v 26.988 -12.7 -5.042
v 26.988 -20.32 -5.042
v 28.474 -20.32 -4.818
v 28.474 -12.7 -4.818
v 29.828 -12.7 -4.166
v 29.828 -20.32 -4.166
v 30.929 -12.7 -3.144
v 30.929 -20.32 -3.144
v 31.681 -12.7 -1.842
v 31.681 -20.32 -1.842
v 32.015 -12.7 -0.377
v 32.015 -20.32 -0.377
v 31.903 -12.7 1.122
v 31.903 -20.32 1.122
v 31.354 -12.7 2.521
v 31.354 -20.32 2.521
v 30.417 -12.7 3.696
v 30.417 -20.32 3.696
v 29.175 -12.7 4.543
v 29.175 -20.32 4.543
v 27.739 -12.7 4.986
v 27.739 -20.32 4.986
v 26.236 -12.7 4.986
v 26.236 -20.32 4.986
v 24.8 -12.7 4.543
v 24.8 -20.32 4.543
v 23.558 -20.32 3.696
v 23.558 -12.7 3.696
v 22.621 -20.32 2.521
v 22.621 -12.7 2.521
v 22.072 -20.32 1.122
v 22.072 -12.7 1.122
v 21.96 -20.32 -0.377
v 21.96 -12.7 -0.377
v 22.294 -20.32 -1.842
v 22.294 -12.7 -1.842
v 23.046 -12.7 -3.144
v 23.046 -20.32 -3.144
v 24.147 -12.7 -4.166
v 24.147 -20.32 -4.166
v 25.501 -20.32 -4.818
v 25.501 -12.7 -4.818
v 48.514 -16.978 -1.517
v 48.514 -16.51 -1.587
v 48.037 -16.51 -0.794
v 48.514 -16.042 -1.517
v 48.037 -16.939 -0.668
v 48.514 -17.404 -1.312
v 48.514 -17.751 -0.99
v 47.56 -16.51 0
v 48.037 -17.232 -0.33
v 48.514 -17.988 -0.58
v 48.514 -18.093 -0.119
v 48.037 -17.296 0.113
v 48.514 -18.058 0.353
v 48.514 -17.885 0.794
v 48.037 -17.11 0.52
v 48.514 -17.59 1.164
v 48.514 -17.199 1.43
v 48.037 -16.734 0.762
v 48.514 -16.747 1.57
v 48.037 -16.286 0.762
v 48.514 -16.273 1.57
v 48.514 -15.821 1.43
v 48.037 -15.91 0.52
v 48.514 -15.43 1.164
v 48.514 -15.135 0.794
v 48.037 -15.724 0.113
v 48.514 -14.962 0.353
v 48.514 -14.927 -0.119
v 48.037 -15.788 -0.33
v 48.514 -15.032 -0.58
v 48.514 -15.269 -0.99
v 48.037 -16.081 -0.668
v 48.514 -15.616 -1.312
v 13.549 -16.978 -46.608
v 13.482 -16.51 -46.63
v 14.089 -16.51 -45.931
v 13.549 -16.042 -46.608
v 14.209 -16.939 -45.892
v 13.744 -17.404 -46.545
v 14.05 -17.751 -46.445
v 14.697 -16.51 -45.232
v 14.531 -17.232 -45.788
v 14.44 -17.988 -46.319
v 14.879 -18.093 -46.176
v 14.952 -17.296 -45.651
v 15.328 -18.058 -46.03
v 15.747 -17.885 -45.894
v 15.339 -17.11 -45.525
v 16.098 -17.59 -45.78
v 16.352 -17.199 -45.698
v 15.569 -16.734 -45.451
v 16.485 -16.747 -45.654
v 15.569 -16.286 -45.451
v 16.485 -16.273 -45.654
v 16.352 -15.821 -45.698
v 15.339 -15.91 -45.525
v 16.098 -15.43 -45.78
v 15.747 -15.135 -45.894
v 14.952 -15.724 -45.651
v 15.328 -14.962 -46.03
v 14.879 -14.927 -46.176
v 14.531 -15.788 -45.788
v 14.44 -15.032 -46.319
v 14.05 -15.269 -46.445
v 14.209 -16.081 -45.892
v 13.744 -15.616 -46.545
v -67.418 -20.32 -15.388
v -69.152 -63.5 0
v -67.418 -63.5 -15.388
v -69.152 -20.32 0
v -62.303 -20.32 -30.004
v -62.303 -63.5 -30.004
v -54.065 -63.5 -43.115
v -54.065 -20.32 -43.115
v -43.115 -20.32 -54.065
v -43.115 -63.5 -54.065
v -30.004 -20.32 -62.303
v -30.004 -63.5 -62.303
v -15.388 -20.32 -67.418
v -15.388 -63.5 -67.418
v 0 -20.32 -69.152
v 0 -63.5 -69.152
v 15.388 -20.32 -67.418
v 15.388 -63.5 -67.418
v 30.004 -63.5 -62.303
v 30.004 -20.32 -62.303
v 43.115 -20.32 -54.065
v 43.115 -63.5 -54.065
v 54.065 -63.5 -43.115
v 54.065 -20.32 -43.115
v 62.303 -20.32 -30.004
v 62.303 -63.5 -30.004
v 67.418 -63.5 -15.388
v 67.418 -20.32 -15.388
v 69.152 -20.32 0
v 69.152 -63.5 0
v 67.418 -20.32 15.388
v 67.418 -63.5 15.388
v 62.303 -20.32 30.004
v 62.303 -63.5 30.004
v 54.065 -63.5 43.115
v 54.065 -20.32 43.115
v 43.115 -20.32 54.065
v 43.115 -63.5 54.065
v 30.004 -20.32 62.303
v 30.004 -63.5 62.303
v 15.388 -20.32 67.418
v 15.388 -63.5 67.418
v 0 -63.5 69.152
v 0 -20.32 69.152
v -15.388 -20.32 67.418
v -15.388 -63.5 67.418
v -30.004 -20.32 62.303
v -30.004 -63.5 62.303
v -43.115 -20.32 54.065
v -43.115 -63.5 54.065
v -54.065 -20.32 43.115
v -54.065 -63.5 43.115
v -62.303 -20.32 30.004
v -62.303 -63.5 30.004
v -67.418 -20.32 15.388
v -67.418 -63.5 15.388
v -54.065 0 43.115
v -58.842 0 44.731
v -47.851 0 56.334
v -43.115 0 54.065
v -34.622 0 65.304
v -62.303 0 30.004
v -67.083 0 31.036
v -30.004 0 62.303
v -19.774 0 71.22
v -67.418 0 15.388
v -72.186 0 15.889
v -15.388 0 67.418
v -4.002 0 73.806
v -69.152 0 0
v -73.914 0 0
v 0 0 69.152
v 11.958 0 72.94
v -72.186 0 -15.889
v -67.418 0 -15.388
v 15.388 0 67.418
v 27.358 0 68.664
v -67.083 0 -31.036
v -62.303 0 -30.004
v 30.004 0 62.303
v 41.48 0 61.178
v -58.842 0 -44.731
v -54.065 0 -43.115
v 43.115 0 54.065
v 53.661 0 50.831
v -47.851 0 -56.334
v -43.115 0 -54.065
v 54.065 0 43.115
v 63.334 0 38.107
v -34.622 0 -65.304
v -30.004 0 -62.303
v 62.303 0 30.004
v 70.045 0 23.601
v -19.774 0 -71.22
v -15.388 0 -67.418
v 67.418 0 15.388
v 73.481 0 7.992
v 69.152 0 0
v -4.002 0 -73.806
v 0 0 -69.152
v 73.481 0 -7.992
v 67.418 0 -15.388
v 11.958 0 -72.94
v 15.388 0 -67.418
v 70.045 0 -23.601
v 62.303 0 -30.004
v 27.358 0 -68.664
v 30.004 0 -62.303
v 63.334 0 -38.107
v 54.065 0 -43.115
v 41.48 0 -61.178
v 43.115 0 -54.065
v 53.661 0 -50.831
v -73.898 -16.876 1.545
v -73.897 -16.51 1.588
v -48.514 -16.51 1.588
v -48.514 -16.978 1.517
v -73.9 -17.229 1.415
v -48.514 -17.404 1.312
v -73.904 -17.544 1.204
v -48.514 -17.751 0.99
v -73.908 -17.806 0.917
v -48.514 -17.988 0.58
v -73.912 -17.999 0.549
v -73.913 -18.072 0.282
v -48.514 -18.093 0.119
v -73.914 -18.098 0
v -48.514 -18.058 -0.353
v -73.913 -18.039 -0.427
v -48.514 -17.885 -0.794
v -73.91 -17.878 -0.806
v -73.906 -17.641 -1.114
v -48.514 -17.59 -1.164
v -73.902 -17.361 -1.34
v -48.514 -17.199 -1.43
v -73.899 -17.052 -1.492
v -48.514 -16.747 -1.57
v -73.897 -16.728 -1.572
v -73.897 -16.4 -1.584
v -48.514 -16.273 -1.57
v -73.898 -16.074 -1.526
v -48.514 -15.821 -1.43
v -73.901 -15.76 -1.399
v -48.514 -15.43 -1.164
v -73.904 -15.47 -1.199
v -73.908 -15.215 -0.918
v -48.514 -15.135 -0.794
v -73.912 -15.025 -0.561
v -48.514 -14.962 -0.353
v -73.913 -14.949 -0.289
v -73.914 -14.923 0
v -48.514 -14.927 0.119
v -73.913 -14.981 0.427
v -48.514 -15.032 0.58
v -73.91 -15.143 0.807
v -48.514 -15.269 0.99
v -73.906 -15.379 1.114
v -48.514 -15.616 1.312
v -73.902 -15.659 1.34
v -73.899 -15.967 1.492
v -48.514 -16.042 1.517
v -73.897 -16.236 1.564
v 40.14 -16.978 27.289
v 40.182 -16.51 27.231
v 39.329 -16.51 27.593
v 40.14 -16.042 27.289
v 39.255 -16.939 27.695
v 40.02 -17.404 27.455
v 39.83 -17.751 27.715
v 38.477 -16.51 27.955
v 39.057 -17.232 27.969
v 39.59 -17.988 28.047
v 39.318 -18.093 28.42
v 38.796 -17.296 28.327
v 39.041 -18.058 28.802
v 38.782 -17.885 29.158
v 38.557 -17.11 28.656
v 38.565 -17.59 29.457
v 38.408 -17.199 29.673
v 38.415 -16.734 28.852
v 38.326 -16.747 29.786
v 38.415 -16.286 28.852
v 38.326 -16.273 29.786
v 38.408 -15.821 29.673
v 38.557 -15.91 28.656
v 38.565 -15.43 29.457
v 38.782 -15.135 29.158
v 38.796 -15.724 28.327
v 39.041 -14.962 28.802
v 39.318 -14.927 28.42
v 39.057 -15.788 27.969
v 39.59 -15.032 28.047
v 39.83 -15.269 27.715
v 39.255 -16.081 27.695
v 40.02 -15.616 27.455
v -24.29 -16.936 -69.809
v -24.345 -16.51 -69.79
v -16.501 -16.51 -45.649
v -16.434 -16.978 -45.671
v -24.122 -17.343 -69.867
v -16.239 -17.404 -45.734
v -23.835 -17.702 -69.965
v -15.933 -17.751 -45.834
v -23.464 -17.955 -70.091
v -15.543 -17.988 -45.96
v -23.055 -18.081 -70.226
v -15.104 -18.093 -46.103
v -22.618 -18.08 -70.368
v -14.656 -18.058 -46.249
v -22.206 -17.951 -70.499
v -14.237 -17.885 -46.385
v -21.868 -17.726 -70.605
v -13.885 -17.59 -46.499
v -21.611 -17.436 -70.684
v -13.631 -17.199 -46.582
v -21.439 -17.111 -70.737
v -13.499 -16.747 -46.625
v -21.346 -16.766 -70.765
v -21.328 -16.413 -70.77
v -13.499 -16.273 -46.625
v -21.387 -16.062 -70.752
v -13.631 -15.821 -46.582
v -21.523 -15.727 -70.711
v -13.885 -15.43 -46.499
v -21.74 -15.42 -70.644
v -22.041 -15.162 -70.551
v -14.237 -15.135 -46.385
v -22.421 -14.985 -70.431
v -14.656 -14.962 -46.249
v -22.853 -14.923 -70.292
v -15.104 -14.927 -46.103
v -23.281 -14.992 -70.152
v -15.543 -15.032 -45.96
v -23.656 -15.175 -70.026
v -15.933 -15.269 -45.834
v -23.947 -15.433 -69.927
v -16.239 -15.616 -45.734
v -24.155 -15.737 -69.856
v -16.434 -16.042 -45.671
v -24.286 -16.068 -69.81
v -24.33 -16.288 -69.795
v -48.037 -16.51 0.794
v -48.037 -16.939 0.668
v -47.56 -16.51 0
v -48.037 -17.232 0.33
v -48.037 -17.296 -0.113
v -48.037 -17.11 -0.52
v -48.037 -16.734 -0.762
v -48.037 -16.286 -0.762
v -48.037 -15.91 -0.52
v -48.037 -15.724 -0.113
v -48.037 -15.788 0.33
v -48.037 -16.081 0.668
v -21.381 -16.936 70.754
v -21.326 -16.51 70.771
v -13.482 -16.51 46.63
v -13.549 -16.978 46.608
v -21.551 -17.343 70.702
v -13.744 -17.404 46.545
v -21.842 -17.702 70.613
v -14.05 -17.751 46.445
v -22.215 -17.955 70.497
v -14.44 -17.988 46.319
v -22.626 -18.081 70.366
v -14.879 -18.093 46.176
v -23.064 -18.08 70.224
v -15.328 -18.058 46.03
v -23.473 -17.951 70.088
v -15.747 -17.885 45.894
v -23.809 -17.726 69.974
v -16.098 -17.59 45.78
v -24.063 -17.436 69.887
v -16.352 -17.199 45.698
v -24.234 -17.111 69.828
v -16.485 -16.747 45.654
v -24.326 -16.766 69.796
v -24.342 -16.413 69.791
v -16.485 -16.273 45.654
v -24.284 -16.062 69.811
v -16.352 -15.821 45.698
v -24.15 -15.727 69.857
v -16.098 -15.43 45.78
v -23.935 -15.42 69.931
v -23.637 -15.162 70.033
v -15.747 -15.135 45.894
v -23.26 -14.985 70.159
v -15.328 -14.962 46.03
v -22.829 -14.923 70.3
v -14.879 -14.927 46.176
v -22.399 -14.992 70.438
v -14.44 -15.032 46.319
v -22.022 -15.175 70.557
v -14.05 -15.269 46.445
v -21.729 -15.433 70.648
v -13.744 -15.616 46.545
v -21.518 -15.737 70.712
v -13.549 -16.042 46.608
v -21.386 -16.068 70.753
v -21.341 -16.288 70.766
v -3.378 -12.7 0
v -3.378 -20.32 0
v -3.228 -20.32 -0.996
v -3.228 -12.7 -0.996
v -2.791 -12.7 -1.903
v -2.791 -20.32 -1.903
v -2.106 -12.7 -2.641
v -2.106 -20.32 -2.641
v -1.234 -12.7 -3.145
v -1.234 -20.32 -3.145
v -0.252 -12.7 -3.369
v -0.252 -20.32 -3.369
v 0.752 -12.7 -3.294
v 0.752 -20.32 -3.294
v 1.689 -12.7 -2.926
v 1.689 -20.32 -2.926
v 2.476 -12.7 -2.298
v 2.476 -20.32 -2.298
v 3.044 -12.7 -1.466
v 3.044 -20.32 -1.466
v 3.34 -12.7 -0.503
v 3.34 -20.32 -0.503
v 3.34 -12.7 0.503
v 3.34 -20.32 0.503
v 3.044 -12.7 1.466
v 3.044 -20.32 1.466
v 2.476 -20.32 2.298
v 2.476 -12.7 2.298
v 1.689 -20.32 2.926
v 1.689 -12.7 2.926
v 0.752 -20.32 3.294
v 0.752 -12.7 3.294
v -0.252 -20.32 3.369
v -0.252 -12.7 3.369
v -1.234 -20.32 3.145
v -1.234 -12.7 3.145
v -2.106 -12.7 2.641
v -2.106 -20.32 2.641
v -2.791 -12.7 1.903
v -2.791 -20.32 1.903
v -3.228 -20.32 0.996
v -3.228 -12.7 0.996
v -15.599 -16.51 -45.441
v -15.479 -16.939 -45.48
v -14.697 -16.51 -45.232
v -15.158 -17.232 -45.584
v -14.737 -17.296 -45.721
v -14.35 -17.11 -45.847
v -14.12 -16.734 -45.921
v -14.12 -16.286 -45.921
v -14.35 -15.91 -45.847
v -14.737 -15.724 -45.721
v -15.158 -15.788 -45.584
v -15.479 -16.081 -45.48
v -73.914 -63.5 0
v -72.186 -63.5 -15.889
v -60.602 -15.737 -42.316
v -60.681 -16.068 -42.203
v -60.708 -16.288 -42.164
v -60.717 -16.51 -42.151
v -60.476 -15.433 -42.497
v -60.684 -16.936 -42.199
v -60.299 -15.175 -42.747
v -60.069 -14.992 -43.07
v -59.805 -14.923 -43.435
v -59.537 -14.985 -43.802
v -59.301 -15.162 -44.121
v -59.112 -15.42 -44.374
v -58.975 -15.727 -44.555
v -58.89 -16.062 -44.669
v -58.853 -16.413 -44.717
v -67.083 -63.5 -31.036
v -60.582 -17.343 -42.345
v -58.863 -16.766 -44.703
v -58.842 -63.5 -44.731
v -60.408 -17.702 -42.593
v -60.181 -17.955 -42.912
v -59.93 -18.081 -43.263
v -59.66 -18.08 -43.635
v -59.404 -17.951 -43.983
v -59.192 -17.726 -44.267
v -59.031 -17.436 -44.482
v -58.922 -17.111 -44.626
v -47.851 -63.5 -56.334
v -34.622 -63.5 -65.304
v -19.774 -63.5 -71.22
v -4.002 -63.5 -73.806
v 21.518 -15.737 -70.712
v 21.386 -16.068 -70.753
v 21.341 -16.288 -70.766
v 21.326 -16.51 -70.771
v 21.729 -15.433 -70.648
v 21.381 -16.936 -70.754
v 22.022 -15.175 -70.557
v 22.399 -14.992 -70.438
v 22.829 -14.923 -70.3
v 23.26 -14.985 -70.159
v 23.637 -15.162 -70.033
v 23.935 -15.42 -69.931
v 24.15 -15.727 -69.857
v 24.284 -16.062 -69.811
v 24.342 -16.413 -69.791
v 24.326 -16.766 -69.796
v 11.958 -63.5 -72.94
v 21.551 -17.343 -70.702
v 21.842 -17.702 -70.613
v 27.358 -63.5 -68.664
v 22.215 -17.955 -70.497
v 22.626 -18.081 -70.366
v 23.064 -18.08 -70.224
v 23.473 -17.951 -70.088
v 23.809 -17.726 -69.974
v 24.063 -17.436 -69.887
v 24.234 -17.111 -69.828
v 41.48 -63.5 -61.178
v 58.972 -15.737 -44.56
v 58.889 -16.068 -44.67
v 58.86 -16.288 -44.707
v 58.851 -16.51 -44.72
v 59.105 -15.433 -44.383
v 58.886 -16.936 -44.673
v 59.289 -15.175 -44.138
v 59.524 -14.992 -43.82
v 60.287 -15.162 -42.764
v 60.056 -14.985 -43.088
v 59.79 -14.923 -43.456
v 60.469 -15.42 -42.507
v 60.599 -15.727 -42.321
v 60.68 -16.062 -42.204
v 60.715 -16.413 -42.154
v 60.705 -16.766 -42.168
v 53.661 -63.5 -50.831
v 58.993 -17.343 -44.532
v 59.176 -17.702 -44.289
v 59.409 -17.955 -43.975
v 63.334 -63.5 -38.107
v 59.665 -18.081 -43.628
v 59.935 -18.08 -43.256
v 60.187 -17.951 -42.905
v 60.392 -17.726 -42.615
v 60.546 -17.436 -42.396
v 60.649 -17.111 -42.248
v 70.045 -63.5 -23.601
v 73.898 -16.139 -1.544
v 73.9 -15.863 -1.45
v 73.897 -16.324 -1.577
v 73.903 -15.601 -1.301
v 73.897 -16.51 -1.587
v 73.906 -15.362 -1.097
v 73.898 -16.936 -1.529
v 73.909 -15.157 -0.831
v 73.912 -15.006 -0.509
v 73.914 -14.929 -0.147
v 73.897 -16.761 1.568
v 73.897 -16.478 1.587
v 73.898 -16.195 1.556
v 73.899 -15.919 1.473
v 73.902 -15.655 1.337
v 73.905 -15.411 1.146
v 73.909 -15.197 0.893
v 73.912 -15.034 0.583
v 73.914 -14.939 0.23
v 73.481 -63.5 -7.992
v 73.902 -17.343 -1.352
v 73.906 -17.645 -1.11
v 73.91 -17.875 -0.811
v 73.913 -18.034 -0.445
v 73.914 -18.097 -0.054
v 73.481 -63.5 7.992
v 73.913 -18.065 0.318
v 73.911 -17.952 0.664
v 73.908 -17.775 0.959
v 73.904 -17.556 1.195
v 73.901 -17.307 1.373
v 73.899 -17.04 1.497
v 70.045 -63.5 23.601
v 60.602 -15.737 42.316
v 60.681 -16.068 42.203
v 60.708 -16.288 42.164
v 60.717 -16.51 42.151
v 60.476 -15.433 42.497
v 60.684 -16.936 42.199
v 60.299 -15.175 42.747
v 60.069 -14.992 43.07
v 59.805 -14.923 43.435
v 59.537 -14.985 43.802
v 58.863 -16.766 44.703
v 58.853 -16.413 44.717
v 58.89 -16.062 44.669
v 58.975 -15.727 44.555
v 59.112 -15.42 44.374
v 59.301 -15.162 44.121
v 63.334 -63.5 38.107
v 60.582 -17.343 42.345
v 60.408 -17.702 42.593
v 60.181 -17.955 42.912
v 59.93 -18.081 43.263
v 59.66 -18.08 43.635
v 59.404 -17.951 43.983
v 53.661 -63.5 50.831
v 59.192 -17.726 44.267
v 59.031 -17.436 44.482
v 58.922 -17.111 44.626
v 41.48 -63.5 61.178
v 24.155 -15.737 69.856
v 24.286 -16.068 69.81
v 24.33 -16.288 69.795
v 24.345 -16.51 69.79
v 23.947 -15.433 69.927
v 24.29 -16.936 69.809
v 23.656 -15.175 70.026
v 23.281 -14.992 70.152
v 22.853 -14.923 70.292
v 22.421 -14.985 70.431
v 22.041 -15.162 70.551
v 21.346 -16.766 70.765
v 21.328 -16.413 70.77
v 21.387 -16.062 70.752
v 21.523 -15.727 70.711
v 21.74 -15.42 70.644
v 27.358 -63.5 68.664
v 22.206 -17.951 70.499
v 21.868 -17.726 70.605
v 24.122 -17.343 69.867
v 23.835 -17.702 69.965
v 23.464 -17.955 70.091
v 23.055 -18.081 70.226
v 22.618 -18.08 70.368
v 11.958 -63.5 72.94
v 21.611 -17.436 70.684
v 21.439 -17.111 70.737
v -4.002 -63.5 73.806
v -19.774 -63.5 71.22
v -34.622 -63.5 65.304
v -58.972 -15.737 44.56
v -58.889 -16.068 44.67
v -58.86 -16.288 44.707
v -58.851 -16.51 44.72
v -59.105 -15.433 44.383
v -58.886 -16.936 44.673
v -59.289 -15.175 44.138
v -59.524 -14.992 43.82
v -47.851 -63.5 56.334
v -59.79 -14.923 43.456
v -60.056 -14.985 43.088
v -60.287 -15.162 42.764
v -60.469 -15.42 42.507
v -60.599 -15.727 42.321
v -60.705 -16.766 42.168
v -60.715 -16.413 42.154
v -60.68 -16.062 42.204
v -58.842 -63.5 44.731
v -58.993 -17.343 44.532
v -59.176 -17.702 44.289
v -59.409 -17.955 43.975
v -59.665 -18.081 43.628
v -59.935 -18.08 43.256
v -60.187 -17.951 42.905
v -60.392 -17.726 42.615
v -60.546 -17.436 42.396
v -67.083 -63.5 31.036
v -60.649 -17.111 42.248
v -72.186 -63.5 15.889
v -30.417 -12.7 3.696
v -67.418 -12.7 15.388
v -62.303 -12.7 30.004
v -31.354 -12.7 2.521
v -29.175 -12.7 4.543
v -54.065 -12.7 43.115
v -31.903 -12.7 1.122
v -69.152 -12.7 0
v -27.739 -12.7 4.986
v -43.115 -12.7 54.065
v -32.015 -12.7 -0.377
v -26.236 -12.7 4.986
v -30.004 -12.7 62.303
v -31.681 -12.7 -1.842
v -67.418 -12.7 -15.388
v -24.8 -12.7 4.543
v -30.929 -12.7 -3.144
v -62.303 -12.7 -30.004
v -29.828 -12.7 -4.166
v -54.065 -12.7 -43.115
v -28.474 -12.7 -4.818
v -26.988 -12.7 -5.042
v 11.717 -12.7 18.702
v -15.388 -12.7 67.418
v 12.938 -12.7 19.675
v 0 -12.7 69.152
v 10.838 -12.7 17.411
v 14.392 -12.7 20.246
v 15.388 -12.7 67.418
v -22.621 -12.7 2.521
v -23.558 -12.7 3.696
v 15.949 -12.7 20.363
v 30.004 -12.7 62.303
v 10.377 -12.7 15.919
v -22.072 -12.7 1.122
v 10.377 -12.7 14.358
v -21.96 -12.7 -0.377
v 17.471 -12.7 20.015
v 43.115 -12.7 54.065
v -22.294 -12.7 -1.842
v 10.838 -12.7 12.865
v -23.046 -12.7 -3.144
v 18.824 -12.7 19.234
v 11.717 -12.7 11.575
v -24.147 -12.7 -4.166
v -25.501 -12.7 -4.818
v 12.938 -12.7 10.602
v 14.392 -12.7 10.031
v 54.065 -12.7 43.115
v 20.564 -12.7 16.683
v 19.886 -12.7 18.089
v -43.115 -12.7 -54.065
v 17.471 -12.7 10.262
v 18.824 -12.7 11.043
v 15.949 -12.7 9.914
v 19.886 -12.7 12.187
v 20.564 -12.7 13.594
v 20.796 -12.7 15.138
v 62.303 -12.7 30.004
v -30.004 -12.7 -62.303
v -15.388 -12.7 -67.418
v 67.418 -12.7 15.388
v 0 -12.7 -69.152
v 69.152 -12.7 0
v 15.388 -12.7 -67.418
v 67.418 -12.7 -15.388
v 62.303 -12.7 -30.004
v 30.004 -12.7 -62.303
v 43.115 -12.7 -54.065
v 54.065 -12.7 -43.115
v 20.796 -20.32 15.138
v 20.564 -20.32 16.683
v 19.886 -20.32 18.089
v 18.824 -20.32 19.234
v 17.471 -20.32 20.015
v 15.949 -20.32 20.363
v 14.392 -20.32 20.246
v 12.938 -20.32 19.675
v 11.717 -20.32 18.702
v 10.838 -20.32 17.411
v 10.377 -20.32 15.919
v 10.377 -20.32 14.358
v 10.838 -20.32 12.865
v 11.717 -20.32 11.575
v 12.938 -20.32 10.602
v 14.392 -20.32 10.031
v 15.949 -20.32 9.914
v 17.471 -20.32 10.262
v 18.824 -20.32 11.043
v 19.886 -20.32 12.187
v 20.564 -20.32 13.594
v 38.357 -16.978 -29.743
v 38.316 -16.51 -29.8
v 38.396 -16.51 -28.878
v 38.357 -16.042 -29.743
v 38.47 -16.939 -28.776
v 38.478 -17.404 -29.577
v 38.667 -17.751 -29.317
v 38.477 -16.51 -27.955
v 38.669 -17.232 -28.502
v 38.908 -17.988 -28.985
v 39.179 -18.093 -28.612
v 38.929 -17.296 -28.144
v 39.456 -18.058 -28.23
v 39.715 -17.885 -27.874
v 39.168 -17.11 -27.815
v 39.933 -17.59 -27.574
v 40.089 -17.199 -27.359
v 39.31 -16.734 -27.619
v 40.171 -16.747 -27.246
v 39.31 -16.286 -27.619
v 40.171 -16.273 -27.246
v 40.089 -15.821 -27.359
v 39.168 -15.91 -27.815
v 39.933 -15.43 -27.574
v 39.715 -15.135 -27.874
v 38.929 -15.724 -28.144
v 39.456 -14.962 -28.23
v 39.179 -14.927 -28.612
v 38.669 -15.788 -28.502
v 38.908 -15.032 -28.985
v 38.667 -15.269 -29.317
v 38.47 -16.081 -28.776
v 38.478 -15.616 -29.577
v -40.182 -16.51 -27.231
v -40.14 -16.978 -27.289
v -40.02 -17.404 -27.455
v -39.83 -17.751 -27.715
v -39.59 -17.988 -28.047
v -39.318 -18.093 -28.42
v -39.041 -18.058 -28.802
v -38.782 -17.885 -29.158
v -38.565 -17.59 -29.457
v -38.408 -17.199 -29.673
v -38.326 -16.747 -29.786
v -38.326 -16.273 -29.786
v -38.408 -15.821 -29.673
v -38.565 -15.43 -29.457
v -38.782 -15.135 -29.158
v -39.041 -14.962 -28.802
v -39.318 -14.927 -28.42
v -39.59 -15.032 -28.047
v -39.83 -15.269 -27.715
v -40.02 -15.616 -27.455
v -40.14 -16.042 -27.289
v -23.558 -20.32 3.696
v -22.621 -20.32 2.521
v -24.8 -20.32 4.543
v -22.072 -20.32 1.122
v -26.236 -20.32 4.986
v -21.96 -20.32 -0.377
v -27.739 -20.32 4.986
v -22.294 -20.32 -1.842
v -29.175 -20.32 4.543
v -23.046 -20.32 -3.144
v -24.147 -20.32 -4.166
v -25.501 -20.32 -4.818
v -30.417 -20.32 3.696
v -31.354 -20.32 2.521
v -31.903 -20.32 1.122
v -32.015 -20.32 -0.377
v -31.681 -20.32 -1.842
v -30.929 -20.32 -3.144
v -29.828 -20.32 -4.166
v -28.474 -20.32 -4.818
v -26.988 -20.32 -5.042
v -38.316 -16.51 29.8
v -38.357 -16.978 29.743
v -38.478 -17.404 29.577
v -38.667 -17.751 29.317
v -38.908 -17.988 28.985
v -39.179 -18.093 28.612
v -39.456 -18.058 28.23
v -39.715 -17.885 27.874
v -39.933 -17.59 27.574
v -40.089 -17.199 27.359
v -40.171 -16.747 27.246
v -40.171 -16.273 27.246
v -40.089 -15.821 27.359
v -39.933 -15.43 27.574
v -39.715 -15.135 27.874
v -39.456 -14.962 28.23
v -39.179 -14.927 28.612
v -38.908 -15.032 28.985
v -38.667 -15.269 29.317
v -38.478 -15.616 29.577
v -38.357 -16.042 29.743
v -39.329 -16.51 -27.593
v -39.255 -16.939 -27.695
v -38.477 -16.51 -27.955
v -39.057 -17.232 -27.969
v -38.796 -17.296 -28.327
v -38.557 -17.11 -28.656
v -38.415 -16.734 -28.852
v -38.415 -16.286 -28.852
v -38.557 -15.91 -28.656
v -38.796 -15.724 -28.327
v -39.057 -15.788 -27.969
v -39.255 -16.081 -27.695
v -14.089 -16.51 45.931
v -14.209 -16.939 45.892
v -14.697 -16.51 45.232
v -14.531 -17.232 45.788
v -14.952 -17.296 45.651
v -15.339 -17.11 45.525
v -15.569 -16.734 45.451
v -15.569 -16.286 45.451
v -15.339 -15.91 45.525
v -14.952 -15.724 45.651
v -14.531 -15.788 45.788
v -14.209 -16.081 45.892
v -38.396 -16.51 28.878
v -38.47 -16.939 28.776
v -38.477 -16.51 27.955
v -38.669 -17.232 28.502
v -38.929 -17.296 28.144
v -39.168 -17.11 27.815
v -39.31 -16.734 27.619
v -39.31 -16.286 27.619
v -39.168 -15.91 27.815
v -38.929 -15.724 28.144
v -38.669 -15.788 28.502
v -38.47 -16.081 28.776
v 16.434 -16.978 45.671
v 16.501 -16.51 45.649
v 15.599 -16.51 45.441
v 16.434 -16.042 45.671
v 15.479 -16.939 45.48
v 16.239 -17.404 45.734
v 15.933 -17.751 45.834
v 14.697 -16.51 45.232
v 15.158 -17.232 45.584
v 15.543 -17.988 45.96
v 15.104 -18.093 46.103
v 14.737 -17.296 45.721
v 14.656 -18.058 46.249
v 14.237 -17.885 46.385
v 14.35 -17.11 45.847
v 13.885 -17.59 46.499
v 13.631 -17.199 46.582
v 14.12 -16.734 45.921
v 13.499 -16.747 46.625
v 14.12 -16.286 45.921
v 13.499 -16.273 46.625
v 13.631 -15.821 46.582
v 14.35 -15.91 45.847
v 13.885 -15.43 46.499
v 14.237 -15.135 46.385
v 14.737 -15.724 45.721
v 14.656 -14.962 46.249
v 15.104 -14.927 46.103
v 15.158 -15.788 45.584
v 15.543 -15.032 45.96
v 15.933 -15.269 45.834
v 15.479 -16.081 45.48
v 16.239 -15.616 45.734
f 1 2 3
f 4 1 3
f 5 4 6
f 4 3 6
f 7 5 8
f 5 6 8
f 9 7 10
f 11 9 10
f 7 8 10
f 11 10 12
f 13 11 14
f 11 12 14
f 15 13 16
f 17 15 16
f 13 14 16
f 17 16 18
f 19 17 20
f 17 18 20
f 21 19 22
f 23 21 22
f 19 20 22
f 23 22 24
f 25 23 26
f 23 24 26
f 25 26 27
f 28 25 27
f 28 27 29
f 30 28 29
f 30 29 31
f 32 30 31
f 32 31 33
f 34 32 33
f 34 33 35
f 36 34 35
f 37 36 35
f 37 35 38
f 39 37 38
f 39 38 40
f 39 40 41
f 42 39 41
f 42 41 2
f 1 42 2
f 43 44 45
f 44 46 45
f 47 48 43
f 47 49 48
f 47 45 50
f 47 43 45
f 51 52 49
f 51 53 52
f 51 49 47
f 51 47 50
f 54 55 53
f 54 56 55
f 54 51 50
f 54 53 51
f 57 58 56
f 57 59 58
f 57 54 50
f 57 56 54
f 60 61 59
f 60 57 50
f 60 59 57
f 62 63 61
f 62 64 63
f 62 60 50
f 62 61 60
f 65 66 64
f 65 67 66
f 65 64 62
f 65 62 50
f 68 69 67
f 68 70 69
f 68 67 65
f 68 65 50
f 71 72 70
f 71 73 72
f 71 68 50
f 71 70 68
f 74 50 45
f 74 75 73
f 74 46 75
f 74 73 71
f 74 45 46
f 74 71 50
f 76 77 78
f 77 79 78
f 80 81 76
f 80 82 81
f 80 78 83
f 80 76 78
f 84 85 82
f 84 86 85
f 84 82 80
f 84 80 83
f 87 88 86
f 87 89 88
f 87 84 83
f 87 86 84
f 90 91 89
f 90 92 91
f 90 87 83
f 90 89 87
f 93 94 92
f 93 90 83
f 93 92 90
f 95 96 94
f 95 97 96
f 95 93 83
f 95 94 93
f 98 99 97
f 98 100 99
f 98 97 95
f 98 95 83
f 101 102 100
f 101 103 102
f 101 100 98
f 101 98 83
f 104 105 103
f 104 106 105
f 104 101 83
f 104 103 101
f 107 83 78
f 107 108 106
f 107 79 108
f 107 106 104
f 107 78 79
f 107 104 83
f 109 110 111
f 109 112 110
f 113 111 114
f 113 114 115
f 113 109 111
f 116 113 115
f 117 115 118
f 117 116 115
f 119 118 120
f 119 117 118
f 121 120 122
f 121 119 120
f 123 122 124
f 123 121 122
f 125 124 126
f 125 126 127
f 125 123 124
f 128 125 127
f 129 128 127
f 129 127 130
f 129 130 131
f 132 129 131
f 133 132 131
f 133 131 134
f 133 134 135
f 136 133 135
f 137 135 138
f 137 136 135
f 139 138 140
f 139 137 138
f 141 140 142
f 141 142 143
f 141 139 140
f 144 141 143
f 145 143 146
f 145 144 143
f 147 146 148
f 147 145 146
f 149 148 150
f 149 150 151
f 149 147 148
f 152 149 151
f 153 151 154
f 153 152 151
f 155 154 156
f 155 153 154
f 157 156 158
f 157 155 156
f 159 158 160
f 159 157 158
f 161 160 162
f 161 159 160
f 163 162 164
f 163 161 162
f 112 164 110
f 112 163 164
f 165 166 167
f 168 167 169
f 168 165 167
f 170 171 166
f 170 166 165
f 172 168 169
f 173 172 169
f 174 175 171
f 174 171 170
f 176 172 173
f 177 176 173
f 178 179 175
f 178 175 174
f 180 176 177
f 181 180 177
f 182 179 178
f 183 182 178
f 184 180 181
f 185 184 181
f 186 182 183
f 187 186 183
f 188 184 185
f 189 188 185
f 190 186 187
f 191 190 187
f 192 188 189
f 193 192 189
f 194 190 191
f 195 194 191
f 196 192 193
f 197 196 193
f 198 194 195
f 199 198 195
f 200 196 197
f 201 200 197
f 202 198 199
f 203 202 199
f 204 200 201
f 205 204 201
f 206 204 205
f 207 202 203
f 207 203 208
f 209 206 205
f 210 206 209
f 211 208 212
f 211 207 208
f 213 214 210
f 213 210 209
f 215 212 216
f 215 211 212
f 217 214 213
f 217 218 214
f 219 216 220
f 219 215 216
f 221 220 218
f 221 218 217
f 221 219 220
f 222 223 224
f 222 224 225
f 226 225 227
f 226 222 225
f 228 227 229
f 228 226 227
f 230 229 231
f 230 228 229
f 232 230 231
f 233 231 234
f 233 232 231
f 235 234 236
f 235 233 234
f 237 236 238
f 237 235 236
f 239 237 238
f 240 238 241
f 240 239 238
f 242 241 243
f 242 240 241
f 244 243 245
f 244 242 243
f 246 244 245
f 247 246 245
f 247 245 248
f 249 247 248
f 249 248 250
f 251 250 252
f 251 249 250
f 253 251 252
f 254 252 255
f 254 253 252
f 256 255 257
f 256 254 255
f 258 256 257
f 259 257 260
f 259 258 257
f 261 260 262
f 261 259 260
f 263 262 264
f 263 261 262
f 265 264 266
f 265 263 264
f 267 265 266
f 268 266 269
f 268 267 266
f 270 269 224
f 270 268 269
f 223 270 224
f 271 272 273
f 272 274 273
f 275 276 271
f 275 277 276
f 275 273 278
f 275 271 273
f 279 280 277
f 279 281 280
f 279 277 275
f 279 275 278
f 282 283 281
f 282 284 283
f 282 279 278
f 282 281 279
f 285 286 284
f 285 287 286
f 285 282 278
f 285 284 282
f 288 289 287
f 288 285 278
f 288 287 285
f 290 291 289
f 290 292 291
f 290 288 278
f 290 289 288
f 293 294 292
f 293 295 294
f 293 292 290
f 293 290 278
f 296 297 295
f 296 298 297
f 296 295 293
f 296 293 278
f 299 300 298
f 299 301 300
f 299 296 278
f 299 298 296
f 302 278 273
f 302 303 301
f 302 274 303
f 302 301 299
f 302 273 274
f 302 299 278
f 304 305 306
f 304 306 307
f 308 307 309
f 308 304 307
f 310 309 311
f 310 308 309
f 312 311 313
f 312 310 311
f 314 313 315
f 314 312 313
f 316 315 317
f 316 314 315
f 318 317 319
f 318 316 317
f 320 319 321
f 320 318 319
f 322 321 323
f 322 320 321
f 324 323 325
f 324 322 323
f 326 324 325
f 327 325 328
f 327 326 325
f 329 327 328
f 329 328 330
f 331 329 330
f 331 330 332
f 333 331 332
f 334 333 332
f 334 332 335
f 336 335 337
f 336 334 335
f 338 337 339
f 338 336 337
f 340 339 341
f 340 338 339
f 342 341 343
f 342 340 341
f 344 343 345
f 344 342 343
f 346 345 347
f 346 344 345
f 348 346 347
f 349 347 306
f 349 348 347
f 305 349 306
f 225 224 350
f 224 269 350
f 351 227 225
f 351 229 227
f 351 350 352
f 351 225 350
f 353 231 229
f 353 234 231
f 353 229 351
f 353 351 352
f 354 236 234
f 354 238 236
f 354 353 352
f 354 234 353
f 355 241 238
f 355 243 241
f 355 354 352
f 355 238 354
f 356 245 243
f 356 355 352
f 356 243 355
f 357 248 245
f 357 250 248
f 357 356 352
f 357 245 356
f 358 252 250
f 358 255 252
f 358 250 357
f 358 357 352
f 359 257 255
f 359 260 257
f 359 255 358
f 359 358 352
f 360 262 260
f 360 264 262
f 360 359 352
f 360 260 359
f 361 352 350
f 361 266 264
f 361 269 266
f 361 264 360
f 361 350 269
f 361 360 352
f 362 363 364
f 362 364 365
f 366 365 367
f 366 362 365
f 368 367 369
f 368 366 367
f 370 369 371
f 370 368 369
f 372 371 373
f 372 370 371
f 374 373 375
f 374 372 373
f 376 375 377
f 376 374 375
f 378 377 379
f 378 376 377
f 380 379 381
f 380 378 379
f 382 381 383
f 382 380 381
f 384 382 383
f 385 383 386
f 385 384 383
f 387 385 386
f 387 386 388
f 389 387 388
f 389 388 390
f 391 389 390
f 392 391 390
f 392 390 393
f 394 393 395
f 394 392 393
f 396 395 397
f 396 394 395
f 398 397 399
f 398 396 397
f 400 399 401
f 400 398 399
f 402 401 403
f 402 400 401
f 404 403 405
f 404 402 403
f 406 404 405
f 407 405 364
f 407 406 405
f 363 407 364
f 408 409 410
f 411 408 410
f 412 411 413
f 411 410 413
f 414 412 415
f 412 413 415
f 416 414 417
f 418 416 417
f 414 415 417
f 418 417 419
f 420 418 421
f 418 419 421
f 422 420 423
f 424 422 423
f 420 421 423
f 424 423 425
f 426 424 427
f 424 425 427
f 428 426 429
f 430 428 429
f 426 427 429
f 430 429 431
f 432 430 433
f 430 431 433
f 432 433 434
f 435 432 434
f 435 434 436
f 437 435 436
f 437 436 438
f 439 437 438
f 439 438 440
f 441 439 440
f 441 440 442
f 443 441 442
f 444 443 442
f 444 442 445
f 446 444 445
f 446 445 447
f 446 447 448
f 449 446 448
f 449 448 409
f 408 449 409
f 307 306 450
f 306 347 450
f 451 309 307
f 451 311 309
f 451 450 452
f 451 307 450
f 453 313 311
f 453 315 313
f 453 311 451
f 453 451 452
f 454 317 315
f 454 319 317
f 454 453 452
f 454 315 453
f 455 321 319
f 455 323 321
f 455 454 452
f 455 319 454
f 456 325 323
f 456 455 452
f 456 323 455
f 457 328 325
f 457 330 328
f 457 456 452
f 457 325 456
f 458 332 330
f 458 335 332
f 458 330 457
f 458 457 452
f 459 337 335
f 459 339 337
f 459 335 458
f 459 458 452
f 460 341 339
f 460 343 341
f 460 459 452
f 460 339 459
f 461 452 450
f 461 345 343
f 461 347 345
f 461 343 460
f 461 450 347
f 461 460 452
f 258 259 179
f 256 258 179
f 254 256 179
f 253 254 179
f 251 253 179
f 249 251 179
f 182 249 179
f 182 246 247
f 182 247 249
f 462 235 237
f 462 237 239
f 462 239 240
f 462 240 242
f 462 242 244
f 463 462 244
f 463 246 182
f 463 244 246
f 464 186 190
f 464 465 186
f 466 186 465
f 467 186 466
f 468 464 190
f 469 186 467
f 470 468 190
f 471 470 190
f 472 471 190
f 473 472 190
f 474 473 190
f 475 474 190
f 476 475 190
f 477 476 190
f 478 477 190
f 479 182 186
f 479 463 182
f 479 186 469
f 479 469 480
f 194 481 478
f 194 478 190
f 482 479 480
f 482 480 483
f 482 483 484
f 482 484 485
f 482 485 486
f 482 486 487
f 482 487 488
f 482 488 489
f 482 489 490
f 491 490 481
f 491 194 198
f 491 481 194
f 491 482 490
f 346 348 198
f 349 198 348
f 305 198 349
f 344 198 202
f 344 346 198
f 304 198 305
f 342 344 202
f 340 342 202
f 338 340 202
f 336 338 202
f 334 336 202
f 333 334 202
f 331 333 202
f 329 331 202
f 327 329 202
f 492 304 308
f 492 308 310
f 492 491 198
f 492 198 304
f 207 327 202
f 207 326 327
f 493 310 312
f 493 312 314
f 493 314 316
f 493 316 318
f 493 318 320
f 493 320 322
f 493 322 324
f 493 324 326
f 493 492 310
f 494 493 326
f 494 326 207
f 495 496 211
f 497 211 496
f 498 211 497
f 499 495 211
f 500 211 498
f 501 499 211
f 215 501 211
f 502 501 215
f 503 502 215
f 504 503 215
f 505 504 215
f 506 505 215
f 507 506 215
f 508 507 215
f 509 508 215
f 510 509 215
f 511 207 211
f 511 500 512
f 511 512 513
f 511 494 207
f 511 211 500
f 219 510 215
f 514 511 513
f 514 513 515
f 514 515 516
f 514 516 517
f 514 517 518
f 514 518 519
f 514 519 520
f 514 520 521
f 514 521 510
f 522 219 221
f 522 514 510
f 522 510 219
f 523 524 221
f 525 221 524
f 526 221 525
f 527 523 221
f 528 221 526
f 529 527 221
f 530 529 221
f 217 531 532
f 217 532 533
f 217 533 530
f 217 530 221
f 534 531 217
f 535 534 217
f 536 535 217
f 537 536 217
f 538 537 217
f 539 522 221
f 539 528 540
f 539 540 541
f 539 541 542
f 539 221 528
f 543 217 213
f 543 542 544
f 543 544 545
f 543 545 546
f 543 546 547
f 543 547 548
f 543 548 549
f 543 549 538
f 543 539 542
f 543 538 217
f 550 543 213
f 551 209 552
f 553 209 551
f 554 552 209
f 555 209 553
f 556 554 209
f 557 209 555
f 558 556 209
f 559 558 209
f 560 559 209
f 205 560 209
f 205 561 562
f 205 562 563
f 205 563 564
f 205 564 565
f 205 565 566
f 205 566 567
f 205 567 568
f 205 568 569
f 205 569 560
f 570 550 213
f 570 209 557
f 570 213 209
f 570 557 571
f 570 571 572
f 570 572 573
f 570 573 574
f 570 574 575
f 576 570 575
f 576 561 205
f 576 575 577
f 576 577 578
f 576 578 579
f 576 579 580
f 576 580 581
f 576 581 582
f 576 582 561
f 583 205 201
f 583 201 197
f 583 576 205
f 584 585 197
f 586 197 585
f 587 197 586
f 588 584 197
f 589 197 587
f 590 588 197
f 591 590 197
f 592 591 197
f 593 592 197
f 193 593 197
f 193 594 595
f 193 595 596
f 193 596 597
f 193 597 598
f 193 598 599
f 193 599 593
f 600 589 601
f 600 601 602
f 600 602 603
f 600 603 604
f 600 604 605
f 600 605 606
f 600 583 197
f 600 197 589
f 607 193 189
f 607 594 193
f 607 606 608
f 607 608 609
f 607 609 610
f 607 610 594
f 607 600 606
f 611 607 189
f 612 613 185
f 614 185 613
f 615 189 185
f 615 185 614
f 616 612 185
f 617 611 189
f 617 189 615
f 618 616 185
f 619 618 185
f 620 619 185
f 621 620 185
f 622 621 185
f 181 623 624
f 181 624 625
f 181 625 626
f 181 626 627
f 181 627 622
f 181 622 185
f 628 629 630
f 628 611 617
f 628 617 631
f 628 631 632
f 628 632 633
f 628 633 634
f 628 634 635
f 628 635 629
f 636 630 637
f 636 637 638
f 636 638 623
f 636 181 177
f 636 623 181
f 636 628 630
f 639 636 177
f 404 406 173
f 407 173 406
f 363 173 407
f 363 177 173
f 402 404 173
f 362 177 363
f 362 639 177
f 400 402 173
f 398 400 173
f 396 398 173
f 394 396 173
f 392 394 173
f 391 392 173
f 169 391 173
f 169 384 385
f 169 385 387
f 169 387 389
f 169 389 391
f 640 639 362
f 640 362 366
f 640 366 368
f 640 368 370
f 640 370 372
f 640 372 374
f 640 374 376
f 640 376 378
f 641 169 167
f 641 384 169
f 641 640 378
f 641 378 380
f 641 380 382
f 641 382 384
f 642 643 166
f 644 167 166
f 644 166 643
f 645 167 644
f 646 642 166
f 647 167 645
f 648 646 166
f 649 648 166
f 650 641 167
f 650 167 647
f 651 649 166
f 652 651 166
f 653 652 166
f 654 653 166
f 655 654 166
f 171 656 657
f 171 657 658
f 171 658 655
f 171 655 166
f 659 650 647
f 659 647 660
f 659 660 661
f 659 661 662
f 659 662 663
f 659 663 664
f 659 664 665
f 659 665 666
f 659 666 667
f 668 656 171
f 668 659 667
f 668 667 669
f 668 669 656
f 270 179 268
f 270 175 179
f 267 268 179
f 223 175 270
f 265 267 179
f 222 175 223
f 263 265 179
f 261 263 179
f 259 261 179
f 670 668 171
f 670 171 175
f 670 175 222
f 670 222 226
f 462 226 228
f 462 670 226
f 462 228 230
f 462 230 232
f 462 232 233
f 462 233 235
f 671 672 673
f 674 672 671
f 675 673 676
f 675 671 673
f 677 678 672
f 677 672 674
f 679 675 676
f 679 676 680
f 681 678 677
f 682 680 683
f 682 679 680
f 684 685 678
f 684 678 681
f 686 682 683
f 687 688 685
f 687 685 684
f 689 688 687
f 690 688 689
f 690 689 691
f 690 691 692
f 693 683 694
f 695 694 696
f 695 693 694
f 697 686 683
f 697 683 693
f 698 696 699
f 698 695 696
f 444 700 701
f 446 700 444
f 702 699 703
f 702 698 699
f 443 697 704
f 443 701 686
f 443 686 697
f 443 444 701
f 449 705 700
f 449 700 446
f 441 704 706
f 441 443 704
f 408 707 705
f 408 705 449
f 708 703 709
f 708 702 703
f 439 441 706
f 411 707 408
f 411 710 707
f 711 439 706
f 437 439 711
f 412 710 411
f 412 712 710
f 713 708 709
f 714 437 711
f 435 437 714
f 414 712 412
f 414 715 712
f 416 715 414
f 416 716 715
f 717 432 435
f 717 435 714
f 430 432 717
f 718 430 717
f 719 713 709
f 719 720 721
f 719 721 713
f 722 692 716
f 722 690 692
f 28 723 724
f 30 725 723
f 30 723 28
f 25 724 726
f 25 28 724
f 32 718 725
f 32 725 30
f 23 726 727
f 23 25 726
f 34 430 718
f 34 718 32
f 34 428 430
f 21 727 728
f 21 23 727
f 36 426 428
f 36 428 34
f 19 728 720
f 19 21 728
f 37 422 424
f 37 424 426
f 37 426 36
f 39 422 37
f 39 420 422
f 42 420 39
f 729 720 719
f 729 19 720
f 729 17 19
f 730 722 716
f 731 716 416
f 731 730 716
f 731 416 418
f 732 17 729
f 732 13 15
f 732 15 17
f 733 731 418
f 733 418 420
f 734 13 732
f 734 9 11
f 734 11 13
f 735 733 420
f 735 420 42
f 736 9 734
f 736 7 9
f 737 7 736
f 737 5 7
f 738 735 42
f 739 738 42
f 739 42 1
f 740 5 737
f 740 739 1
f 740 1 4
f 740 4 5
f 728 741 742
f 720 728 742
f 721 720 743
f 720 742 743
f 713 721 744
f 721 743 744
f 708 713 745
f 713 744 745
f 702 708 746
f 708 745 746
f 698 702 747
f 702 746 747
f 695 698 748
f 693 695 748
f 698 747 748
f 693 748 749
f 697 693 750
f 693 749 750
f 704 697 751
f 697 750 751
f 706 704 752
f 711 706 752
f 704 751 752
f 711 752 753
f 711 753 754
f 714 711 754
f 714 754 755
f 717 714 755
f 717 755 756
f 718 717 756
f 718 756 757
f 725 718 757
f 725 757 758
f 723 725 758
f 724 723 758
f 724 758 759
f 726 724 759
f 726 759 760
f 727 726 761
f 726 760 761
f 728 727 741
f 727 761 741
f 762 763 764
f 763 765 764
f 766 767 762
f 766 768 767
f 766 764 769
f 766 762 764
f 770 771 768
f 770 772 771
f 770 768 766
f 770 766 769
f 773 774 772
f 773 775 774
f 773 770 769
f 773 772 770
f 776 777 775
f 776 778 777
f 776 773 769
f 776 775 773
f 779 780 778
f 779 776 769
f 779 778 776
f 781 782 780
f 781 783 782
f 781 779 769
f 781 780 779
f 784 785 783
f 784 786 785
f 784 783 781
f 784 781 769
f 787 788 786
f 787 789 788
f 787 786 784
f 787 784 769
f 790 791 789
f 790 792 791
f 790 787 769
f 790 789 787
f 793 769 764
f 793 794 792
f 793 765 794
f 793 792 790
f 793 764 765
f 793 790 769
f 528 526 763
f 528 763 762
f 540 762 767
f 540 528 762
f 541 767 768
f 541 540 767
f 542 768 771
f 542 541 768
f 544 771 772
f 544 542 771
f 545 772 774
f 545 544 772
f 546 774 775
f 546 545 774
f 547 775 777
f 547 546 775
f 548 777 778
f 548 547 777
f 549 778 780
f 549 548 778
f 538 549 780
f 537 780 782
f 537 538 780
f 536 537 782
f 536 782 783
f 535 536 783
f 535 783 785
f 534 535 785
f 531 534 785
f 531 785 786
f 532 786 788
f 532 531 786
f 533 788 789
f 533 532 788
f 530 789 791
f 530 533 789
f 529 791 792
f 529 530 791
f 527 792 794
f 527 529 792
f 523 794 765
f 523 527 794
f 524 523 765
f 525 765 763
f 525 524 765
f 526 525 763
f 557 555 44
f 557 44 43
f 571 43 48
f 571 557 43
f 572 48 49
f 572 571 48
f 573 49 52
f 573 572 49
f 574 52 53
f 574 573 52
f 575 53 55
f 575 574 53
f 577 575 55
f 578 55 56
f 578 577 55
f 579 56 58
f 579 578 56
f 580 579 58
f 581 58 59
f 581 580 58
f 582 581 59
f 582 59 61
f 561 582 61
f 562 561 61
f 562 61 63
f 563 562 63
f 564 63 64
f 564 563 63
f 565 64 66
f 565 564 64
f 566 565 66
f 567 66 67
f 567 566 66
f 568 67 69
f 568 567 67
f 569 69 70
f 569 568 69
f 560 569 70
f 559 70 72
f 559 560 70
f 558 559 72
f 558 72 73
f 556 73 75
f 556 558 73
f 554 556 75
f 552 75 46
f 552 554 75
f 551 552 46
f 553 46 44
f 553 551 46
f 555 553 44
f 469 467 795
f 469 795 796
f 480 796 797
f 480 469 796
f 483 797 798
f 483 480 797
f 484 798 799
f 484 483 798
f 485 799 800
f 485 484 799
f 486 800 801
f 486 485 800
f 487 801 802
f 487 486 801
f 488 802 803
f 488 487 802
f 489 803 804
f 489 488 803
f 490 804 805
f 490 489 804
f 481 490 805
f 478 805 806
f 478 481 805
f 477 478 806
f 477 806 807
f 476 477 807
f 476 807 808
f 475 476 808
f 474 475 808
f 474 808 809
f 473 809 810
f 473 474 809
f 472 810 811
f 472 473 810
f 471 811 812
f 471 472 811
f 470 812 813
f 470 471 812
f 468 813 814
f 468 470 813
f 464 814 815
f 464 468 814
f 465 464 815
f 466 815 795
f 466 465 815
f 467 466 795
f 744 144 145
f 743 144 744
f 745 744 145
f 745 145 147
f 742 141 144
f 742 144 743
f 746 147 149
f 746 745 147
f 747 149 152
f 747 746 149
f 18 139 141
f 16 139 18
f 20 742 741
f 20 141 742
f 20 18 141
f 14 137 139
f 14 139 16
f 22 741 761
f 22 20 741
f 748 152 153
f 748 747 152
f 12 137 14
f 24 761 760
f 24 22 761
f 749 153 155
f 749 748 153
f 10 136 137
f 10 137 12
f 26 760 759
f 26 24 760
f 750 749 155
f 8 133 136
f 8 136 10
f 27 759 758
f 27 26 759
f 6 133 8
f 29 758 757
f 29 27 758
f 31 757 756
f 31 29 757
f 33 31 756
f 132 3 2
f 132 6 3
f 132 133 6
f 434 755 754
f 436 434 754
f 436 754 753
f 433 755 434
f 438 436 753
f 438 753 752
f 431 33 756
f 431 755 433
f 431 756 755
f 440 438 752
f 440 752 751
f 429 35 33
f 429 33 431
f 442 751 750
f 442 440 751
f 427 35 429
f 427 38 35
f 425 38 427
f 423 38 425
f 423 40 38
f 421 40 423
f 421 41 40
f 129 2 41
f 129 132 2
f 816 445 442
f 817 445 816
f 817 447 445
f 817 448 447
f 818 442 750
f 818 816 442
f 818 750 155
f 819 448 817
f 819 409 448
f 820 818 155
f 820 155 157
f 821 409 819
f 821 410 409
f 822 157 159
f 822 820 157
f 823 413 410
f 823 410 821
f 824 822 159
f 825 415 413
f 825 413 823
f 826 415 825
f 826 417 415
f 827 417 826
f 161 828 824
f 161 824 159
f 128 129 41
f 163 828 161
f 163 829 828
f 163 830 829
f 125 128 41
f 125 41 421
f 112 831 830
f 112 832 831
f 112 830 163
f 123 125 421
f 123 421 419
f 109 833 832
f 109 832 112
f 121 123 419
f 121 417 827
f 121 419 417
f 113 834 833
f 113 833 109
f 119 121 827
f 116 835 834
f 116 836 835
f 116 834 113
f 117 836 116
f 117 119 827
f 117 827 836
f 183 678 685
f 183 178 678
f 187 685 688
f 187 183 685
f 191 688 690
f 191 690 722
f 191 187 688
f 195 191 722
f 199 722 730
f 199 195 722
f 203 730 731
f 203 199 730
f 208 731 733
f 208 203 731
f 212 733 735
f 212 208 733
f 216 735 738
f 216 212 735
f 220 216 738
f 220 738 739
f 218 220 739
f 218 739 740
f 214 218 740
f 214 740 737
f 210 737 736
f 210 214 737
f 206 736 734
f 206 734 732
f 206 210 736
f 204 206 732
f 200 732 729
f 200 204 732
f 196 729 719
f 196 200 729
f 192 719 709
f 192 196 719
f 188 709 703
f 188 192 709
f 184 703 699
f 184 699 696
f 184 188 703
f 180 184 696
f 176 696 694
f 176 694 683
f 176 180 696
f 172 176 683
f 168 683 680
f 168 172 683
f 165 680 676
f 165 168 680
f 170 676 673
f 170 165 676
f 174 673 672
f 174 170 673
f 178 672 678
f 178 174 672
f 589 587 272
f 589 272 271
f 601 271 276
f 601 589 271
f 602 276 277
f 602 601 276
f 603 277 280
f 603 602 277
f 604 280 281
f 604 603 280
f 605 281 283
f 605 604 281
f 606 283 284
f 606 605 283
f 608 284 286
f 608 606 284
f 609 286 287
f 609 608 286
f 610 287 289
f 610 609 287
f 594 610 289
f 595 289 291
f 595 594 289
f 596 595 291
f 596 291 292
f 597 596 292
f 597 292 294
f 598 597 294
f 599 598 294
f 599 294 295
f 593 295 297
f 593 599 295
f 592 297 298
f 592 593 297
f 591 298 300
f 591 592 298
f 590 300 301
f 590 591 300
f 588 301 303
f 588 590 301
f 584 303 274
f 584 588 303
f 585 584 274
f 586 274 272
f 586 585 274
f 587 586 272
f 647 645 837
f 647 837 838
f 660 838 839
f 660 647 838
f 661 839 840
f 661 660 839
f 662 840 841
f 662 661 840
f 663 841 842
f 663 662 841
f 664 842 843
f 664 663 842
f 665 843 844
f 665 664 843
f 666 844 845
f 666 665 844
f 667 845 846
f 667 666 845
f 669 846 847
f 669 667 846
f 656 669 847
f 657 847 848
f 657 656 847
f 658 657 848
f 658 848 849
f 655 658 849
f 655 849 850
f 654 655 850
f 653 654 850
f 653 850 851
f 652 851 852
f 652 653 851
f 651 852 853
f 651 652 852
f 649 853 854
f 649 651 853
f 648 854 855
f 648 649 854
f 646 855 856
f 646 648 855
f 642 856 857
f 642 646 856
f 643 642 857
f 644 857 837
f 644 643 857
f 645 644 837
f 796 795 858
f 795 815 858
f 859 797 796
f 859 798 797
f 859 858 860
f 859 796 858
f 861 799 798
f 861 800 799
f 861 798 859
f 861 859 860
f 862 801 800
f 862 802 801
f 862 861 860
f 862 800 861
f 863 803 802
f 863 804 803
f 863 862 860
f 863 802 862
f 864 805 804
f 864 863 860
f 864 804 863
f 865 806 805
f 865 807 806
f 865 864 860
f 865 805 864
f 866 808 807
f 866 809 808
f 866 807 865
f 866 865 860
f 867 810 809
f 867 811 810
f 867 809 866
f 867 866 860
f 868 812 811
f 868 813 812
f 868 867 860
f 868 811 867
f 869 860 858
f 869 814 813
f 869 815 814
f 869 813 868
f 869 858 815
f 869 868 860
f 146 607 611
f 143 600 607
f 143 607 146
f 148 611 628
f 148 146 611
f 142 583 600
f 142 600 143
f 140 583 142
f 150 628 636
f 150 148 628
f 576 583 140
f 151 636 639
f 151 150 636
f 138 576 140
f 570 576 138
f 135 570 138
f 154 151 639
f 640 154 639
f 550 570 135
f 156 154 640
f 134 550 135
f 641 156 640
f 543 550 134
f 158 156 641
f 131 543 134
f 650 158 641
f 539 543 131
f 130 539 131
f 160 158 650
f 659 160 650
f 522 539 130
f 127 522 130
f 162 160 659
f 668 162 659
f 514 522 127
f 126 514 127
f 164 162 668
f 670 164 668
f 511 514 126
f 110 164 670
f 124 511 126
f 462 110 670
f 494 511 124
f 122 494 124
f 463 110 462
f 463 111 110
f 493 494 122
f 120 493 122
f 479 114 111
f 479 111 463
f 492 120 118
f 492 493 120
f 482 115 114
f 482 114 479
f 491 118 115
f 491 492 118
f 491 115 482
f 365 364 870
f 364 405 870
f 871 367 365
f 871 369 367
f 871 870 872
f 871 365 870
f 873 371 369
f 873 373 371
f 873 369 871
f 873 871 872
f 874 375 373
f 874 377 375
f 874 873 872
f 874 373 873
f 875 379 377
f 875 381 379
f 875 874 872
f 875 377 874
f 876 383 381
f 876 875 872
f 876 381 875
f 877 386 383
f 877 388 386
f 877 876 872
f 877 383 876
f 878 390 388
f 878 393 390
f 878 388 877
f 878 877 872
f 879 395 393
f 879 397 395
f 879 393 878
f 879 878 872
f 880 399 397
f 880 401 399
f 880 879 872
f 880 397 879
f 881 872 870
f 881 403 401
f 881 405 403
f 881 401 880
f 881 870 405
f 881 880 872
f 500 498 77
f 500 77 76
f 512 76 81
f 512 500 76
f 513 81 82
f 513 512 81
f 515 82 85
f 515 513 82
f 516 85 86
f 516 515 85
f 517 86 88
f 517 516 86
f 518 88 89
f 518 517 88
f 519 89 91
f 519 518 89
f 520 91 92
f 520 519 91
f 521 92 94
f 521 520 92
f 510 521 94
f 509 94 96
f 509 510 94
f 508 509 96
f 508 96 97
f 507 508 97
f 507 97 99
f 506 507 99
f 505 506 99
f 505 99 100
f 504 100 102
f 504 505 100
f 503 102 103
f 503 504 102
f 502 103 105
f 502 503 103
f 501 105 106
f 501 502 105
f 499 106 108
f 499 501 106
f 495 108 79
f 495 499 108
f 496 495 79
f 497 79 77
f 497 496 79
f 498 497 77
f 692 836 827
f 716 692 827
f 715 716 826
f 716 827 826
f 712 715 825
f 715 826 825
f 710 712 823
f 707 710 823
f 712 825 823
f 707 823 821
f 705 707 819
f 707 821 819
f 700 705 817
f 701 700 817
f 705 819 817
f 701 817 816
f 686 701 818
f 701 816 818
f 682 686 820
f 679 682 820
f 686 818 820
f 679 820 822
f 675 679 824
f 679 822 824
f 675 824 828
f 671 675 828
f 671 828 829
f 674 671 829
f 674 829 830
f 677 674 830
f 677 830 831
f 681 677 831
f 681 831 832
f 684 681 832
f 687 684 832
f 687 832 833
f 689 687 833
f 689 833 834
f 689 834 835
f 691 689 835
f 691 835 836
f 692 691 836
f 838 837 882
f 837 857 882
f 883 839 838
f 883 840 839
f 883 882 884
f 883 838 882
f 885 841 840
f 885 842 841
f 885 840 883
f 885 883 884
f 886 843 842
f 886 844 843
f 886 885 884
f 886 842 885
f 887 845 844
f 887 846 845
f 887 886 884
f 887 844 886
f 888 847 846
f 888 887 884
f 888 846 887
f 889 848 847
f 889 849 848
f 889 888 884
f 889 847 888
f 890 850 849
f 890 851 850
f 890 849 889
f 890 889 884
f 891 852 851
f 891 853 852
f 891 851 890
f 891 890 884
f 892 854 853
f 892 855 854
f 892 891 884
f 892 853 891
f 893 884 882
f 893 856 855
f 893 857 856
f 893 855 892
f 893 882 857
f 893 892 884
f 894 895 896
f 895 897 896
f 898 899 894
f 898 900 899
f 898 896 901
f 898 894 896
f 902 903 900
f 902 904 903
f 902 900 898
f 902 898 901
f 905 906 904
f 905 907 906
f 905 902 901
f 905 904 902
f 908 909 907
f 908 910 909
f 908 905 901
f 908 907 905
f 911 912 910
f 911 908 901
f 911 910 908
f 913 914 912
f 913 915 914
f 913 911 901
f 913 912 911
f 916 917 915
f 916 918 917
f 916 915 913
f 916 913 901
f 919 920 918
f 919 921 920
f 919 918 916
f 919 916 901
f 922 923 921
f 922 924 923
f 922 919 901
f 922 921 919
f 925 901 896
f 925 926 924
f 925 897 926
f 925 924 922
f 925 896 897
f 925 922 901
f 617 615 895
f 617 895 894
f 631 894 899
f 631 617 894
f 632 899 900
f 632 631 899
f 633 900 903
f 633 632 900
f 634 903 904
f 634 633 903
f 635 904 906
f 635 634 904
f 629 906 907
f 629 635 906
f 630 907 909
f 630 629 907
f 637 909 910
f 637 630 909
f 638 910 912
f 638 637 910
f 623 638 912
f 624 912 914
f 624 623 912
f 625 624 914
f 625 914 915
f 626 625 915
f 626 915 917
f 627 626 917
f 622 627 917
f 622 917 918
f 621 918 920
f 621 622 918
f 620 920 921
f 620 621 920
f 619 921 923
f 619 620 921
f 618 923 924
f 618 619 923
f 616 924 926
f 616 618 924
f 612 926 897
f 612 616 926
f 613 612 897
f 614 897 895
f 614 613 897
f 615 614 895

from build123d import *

# Parameters (mm, degrees)
F_1_4_CLEARANCE_HOLE1_D = 6.7564
CIRPATTERN2_COUNT       = 10
F_3_8_CLEARANCE_HOLE1_D = 10.0838
SKETCH12_R              = 5.23875
CUT_EXTRUDE1_DEPTH      = 7.62


with BuildPart() as part:
    # Sketch1 → Revolve1 (revolve)
    with BuildSketch(Plane.XY):
        Polygon((0, -12.7), (-69.1515, -12.7), (-69.1515, 0), (-73.914, 0), (-73.914, -63.5), (-69.1515, -63.5), (-69.1515, -20.32), (0, -20.32), align=None)
    revolve(axis=Axis((0, 0, 0), (0, -1, 0)))

    # 1/4 Clearance Hole1 (through all)
    with Locations(Plane(origin=(0, -12.7, 0), x_dir=(1, 0, 0), z_dir=(0, 1, 0))):
        with Locations((0, 0)):
            Hole(F_1_4_CLEARANCE_HOLE1_D / 2)

    # Sketch7 → 1/8 (0.1250) Dowel Hole1 (revolve, cut)
    with BuildSketch(Plane(origin=(-73.914, -16.51, 0), x_dir=(0, 0, 1), z_dir=(0, 1, 0))):
        Polygon((0, 0), (0, 26.353866233), (1.5875, 25.4), (1.5875, 0), align=None)
    f_1_8_0_1250_dowel_hole1 = revolve(axis=Axis((-80.264, -16.51, 0), (1, 0, 0)), mode=Mode.SUBTRACT)

    # CirPattern2: 1/8 (0.1250) Dowel Hole1 ×10 about axis
    cirpattern2_axis = Axis((0, 0, 0), (0, 1, 0))
    for i in range(1, CIRPATTERN2_COUNT):
        add(f_1_8_0_1250_dowel_hole1.rotate(cirpattern2_axis, i * 360 / CIRPATTERN2_COUNT), mode=Mode.SUBTRACT)

    # 3/8 Clearance Hole1 (through all)
    with Locations(Plane(origin=(-26.9875, -12.7, 0), x_dir=(0, 0, 1), z_dir=(0, 1, 0))):
        with Locations((0, 0), (0, 53.975)):
            Hole(F_3_8_CLEARANCE_HOLE1_D / 2)

    # Sketch12 → Cut-Extrude1 (cut)
    with BuildSketch(Plane.XZ.offset(20.32)):
        with Locations((15.5575, 15.1384)):
            Circle(SKETCH12_R)
    extrude(amount=-CUT_EXTRUDE1_DEPTH, mode=Mode.SUBTRACT)


solid = part.part
